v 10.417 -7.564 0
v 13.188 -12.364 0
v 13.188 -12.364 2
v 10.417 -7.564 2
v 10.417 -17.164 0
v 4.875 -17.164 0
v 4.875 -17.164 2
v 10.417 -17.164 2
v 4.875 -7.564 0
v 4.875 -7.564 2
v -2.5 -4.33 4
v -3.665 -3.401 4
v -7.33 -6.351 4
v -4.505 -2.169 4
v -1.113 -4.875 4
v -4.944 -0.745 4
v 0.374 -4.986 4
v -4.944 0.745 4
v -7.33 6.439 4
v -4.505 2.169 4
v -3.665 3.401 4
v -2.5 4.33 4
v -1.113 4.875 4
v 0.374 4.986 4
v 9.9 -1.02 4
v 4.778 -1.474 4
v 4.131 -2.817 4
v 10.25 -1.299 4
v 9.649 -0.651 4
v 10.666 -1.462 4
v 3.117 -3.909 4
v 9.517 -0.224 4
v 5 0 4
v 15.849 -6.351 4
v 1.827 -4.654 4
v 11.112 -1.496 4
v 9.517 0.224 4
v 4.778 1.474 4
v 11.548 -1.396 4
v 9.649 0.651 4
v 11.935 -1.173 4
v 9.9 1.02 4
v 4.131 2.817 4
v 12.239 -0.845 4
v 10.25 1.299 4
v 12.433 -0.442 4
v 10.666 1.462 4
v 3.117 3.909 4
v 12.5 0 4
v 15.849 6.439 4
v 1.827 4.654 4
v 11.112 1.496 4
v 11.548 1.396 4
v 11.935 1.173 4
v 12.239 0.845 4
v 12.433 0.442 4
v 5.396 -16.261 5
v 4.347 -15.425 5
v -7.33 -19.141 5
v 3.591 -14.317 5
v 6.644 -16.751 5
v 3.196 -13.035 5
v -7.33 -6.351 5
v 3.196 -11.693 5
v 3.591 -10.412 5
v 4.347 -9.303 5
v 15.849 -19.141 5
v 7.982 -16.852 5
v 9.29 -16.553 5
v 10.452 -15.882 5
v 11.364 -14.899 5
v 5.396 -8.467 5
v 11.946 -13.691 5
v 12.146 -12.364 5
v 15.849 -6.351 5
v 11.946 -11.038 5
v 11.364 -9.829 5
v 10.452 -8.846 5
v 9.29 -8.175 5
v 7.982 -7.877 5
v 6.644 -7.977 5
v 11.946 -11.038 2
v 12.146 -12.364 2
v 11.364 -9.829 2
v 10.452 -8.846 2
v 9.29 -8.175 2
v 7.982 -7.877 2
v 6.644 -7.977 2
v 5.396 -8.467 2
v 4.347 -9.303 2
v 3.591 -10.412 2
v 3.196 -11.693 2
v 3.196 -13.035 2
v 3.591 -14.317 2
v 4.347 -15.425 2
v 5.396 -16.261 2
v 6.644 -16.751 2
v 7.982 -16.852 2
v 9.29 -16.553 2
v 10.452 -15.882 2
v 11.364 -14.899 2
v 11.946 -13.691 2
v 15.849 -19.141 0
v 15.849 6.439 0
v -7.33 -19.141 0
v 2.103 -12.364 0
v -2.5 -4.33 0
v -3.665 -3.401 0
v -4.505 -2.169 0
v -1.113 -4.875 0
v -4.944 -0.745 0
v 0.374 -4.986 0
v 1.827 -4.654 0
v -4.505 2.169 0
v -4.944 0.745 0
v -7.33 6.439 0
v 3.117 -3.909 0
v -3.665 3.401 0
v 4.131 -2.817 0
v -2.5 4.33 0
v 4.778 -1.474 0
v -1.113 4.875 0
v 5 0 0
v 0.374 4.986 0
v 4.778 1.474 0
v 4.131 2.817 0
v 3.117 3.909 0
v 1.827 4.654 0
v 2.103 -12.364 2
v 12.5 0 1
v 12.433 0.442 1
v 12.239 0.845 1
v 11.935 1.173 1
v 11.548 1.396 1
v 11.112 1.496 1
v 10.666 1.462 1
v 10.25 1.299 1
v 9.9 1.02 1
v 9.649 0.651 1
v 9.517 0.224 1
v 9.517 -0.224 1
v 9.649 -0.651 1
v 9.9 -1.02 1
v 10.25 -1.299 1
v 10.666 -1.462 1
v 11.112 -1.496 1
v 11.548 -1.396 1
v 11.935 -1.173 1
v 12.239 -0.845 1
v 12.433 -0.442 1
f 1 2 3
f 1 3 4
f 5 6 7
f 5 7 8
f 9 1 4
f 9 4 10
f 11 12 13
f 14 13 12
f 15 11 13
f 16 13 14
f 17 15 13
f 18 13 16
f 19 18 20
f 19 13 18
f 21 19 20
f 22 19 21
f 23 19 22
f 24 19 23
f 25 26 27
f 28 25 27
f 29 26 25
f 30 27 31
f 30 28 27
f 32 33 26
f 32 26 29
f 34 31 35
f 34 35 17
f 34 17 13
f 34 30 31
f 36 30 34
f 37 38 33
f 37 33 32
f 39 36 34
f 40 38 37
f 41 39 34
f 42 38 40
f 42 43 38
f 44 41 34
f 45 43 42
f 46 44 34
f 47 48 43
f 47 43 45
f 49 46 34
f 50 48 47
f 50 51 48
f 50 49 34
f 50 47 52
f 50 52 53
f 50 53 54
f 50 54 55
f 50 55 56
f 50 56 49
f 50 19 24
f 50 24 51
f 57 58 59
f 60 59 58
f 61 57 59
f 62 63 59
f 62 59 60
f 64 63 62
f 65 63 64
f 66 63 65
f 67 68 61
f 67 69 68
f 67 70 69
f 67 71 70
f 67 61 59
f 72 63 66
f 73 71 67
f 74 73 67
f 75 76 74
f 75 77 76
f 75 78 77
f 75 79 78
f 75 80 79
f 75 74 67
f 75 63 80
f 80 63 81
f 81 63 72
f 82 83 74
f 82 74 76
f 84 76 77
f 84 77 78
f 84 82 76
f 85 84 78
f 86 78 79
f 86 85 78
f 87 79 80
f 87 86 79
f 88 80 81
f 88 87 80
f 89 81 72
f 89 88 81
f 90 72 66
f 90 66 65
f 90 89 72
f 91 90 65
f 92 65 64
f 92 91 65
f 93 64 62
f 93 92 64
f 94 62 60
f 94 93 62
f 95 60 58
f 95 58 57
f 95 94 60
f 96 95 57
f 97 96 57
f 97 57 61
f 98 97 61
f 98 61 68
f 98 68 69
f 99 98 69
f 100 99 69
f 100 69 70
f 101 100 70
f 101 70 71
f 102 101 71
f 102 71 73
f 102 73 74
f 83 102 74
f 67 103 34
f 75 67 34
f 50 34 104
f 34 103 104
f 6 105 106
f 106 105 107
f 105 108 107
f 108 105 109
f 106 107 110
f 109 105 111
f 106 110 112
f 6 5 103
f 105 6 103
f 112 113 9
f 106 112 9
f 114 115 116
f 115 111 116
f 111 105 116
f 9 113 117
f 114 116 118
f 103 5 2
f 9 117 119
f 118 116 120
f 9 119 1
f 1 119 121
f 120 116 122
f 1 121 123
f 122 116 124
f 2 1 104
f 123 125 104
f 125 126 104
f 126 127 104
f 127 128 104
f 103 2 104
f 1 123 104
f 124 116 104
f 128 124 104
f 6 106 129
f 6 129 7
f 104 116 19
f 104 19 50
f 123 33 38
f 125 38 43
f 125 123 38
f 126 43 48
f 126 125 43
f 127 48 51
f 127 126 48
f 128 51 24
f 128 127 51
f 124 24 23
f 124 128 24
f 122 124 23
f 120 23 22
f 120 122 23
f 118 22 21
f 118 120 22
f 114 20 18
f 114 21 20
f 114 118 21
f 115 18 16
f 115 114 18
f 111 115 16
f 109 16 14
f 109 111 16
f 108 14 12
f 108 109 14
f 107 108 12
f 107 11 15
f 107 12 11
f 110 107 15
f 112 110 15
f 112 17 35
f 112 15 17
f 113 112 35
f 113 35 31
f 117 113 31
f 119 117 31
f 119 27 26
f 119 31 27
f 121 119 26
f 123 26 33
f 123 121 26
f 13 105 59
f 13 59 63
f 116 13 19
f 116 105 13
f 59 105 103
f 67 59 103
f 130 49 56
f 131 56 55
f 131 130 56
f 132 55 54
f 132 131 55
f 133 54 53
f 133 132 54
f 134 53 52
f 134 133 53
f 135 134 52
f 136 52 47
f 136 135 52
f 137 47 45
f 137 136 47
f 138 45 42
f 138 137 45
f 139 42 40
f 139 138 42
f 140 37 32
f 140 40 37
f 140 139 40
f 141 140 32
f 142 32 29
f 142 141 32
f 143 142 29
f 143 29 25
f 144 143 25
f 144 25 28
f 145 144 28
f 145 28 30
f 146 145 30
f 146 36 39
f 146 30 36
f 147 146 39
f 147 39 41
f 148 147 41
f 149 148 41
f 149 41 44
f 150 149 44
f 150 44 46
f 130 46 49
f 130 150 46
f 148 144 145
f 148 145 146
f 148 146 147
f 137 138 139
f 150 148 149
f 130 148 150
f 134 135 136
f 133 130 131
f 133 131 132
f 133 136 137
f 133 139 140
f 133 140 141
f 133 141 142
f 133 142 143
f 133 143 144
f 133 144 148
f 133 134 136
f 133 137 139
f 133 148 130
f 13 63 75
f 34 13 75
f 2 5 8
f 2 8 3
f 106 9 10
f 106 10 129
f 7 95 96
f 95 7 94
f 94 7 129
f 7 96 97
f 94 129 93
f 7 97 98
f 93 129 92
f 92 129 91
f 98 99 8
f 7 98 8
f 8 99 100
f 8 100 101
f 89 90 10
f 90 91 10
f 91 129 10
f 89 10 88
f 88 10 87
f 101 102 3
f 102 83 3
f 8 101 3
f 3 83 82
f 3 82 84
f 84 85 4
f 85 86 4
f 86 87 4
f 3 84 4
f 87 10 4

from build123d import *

# Parameters (mm, degrees)
F0_W     = 23.179245647
F0_H     = 25.5798394792
F0_R     = 5
F0_R_2   = 1.5
F0_R_3   = 4.5
F1_DEPTH = 5
F2_DEPTH = 2
F3_START = 1
F3_DEPTH = 4
F4_W     = 23.179245647
F4_H     = 12.7899197396
F4_R     = 5
F4_R_2   = 1.5
F5_DEPTH = 1


with BuildPart() as f1:
    # F0 (on Top) → F1 (new body)
    with BuildSketch(Plane.XY):
        with Locations((4.2594347615, -6.3512411434)):
            Rectangle(F0_W, F0_H)
        Polygon((2.1032405912, -12.3641875159), (4.8745218833, -7.5641875159), (10.4170844675, -7.5641875159), (13.1883657596, -12.3641875159), (10.4170844675, -17.1641875159), (4.8745218833, -17.1641875159), align=None, mode=Mode.SUBTRACT)
        Circle(F0_R, mode=Mode.SUBTRACT)
        with Locations((11, 0)):
            Circle(F0_R_2, mode=Mode.SUBTRACT)
        Polygon((10.4170844675, -7.5641875159), (4.8745218833, -7.5641875159), (2.1032405912, -12.3641875159), (4.8745218833, -17.1641875159), (10.4170844675, -17.1641875159), (13.1883657596, -12.3641875159), align=None)
        with Locations((7.6458031754, -12.3641875159)):
            Circle(F0_R_3, mode=Mode.SUBTRACT)
        with Locations((11, 0)):
            Circle(F0_R_2)
    extrude(amount=F1_DEPTH)

    # F0 (on Top) → F2 (cut)
    with BuildSketch(Plane.XY):
        Polygon((10.4170844675, -7.5641875159), (4.8745218833, -7.5641875159), (2.1032405912, -12.3641875159), (4.8745218833, -17.1641875159), (10.4170844675, -17.1641875159), (13.1883657596, -12.3641875159), align=None)
        with Locations((7.6458031754, -12.3641875159)):
            Circle(F0_R_3, mode=Mode.SUBTRACT)
    extrude(amount=F2_DEPTH, mode=Mode.SUBTRACT)

    # F0 (on Top) → F3 (cut)
    with BuildSketch(Plane.XY.offset(F3_START)):
        with Locations((11, 0)):
            Circle(F0_R_2)
    extrude(amount=F3_DEPTH, mode=Mode.SUBTRACT)

    # F4 (on face) → F5 (cut)
    with BuildSketch(Plane.XY.offset(5)):
        with Locations((4.2594347615, 0.0437187264)):
            Rectangle(F4_W, F4_H)
        Circle(F4_R, mode=Mode.SUBTRACT)
        with Locations((11, 0)):
            Circle(F4_R_2, mode=Mode.SUBTRACT)
        with Locations((4.2594347615, 0.0437187264)):
            Rectangle(F4_W, F4_H)
    extrude(amount=-F5_DEPTH, mode=Mode.SUBTRACT)


solid = f1.part
